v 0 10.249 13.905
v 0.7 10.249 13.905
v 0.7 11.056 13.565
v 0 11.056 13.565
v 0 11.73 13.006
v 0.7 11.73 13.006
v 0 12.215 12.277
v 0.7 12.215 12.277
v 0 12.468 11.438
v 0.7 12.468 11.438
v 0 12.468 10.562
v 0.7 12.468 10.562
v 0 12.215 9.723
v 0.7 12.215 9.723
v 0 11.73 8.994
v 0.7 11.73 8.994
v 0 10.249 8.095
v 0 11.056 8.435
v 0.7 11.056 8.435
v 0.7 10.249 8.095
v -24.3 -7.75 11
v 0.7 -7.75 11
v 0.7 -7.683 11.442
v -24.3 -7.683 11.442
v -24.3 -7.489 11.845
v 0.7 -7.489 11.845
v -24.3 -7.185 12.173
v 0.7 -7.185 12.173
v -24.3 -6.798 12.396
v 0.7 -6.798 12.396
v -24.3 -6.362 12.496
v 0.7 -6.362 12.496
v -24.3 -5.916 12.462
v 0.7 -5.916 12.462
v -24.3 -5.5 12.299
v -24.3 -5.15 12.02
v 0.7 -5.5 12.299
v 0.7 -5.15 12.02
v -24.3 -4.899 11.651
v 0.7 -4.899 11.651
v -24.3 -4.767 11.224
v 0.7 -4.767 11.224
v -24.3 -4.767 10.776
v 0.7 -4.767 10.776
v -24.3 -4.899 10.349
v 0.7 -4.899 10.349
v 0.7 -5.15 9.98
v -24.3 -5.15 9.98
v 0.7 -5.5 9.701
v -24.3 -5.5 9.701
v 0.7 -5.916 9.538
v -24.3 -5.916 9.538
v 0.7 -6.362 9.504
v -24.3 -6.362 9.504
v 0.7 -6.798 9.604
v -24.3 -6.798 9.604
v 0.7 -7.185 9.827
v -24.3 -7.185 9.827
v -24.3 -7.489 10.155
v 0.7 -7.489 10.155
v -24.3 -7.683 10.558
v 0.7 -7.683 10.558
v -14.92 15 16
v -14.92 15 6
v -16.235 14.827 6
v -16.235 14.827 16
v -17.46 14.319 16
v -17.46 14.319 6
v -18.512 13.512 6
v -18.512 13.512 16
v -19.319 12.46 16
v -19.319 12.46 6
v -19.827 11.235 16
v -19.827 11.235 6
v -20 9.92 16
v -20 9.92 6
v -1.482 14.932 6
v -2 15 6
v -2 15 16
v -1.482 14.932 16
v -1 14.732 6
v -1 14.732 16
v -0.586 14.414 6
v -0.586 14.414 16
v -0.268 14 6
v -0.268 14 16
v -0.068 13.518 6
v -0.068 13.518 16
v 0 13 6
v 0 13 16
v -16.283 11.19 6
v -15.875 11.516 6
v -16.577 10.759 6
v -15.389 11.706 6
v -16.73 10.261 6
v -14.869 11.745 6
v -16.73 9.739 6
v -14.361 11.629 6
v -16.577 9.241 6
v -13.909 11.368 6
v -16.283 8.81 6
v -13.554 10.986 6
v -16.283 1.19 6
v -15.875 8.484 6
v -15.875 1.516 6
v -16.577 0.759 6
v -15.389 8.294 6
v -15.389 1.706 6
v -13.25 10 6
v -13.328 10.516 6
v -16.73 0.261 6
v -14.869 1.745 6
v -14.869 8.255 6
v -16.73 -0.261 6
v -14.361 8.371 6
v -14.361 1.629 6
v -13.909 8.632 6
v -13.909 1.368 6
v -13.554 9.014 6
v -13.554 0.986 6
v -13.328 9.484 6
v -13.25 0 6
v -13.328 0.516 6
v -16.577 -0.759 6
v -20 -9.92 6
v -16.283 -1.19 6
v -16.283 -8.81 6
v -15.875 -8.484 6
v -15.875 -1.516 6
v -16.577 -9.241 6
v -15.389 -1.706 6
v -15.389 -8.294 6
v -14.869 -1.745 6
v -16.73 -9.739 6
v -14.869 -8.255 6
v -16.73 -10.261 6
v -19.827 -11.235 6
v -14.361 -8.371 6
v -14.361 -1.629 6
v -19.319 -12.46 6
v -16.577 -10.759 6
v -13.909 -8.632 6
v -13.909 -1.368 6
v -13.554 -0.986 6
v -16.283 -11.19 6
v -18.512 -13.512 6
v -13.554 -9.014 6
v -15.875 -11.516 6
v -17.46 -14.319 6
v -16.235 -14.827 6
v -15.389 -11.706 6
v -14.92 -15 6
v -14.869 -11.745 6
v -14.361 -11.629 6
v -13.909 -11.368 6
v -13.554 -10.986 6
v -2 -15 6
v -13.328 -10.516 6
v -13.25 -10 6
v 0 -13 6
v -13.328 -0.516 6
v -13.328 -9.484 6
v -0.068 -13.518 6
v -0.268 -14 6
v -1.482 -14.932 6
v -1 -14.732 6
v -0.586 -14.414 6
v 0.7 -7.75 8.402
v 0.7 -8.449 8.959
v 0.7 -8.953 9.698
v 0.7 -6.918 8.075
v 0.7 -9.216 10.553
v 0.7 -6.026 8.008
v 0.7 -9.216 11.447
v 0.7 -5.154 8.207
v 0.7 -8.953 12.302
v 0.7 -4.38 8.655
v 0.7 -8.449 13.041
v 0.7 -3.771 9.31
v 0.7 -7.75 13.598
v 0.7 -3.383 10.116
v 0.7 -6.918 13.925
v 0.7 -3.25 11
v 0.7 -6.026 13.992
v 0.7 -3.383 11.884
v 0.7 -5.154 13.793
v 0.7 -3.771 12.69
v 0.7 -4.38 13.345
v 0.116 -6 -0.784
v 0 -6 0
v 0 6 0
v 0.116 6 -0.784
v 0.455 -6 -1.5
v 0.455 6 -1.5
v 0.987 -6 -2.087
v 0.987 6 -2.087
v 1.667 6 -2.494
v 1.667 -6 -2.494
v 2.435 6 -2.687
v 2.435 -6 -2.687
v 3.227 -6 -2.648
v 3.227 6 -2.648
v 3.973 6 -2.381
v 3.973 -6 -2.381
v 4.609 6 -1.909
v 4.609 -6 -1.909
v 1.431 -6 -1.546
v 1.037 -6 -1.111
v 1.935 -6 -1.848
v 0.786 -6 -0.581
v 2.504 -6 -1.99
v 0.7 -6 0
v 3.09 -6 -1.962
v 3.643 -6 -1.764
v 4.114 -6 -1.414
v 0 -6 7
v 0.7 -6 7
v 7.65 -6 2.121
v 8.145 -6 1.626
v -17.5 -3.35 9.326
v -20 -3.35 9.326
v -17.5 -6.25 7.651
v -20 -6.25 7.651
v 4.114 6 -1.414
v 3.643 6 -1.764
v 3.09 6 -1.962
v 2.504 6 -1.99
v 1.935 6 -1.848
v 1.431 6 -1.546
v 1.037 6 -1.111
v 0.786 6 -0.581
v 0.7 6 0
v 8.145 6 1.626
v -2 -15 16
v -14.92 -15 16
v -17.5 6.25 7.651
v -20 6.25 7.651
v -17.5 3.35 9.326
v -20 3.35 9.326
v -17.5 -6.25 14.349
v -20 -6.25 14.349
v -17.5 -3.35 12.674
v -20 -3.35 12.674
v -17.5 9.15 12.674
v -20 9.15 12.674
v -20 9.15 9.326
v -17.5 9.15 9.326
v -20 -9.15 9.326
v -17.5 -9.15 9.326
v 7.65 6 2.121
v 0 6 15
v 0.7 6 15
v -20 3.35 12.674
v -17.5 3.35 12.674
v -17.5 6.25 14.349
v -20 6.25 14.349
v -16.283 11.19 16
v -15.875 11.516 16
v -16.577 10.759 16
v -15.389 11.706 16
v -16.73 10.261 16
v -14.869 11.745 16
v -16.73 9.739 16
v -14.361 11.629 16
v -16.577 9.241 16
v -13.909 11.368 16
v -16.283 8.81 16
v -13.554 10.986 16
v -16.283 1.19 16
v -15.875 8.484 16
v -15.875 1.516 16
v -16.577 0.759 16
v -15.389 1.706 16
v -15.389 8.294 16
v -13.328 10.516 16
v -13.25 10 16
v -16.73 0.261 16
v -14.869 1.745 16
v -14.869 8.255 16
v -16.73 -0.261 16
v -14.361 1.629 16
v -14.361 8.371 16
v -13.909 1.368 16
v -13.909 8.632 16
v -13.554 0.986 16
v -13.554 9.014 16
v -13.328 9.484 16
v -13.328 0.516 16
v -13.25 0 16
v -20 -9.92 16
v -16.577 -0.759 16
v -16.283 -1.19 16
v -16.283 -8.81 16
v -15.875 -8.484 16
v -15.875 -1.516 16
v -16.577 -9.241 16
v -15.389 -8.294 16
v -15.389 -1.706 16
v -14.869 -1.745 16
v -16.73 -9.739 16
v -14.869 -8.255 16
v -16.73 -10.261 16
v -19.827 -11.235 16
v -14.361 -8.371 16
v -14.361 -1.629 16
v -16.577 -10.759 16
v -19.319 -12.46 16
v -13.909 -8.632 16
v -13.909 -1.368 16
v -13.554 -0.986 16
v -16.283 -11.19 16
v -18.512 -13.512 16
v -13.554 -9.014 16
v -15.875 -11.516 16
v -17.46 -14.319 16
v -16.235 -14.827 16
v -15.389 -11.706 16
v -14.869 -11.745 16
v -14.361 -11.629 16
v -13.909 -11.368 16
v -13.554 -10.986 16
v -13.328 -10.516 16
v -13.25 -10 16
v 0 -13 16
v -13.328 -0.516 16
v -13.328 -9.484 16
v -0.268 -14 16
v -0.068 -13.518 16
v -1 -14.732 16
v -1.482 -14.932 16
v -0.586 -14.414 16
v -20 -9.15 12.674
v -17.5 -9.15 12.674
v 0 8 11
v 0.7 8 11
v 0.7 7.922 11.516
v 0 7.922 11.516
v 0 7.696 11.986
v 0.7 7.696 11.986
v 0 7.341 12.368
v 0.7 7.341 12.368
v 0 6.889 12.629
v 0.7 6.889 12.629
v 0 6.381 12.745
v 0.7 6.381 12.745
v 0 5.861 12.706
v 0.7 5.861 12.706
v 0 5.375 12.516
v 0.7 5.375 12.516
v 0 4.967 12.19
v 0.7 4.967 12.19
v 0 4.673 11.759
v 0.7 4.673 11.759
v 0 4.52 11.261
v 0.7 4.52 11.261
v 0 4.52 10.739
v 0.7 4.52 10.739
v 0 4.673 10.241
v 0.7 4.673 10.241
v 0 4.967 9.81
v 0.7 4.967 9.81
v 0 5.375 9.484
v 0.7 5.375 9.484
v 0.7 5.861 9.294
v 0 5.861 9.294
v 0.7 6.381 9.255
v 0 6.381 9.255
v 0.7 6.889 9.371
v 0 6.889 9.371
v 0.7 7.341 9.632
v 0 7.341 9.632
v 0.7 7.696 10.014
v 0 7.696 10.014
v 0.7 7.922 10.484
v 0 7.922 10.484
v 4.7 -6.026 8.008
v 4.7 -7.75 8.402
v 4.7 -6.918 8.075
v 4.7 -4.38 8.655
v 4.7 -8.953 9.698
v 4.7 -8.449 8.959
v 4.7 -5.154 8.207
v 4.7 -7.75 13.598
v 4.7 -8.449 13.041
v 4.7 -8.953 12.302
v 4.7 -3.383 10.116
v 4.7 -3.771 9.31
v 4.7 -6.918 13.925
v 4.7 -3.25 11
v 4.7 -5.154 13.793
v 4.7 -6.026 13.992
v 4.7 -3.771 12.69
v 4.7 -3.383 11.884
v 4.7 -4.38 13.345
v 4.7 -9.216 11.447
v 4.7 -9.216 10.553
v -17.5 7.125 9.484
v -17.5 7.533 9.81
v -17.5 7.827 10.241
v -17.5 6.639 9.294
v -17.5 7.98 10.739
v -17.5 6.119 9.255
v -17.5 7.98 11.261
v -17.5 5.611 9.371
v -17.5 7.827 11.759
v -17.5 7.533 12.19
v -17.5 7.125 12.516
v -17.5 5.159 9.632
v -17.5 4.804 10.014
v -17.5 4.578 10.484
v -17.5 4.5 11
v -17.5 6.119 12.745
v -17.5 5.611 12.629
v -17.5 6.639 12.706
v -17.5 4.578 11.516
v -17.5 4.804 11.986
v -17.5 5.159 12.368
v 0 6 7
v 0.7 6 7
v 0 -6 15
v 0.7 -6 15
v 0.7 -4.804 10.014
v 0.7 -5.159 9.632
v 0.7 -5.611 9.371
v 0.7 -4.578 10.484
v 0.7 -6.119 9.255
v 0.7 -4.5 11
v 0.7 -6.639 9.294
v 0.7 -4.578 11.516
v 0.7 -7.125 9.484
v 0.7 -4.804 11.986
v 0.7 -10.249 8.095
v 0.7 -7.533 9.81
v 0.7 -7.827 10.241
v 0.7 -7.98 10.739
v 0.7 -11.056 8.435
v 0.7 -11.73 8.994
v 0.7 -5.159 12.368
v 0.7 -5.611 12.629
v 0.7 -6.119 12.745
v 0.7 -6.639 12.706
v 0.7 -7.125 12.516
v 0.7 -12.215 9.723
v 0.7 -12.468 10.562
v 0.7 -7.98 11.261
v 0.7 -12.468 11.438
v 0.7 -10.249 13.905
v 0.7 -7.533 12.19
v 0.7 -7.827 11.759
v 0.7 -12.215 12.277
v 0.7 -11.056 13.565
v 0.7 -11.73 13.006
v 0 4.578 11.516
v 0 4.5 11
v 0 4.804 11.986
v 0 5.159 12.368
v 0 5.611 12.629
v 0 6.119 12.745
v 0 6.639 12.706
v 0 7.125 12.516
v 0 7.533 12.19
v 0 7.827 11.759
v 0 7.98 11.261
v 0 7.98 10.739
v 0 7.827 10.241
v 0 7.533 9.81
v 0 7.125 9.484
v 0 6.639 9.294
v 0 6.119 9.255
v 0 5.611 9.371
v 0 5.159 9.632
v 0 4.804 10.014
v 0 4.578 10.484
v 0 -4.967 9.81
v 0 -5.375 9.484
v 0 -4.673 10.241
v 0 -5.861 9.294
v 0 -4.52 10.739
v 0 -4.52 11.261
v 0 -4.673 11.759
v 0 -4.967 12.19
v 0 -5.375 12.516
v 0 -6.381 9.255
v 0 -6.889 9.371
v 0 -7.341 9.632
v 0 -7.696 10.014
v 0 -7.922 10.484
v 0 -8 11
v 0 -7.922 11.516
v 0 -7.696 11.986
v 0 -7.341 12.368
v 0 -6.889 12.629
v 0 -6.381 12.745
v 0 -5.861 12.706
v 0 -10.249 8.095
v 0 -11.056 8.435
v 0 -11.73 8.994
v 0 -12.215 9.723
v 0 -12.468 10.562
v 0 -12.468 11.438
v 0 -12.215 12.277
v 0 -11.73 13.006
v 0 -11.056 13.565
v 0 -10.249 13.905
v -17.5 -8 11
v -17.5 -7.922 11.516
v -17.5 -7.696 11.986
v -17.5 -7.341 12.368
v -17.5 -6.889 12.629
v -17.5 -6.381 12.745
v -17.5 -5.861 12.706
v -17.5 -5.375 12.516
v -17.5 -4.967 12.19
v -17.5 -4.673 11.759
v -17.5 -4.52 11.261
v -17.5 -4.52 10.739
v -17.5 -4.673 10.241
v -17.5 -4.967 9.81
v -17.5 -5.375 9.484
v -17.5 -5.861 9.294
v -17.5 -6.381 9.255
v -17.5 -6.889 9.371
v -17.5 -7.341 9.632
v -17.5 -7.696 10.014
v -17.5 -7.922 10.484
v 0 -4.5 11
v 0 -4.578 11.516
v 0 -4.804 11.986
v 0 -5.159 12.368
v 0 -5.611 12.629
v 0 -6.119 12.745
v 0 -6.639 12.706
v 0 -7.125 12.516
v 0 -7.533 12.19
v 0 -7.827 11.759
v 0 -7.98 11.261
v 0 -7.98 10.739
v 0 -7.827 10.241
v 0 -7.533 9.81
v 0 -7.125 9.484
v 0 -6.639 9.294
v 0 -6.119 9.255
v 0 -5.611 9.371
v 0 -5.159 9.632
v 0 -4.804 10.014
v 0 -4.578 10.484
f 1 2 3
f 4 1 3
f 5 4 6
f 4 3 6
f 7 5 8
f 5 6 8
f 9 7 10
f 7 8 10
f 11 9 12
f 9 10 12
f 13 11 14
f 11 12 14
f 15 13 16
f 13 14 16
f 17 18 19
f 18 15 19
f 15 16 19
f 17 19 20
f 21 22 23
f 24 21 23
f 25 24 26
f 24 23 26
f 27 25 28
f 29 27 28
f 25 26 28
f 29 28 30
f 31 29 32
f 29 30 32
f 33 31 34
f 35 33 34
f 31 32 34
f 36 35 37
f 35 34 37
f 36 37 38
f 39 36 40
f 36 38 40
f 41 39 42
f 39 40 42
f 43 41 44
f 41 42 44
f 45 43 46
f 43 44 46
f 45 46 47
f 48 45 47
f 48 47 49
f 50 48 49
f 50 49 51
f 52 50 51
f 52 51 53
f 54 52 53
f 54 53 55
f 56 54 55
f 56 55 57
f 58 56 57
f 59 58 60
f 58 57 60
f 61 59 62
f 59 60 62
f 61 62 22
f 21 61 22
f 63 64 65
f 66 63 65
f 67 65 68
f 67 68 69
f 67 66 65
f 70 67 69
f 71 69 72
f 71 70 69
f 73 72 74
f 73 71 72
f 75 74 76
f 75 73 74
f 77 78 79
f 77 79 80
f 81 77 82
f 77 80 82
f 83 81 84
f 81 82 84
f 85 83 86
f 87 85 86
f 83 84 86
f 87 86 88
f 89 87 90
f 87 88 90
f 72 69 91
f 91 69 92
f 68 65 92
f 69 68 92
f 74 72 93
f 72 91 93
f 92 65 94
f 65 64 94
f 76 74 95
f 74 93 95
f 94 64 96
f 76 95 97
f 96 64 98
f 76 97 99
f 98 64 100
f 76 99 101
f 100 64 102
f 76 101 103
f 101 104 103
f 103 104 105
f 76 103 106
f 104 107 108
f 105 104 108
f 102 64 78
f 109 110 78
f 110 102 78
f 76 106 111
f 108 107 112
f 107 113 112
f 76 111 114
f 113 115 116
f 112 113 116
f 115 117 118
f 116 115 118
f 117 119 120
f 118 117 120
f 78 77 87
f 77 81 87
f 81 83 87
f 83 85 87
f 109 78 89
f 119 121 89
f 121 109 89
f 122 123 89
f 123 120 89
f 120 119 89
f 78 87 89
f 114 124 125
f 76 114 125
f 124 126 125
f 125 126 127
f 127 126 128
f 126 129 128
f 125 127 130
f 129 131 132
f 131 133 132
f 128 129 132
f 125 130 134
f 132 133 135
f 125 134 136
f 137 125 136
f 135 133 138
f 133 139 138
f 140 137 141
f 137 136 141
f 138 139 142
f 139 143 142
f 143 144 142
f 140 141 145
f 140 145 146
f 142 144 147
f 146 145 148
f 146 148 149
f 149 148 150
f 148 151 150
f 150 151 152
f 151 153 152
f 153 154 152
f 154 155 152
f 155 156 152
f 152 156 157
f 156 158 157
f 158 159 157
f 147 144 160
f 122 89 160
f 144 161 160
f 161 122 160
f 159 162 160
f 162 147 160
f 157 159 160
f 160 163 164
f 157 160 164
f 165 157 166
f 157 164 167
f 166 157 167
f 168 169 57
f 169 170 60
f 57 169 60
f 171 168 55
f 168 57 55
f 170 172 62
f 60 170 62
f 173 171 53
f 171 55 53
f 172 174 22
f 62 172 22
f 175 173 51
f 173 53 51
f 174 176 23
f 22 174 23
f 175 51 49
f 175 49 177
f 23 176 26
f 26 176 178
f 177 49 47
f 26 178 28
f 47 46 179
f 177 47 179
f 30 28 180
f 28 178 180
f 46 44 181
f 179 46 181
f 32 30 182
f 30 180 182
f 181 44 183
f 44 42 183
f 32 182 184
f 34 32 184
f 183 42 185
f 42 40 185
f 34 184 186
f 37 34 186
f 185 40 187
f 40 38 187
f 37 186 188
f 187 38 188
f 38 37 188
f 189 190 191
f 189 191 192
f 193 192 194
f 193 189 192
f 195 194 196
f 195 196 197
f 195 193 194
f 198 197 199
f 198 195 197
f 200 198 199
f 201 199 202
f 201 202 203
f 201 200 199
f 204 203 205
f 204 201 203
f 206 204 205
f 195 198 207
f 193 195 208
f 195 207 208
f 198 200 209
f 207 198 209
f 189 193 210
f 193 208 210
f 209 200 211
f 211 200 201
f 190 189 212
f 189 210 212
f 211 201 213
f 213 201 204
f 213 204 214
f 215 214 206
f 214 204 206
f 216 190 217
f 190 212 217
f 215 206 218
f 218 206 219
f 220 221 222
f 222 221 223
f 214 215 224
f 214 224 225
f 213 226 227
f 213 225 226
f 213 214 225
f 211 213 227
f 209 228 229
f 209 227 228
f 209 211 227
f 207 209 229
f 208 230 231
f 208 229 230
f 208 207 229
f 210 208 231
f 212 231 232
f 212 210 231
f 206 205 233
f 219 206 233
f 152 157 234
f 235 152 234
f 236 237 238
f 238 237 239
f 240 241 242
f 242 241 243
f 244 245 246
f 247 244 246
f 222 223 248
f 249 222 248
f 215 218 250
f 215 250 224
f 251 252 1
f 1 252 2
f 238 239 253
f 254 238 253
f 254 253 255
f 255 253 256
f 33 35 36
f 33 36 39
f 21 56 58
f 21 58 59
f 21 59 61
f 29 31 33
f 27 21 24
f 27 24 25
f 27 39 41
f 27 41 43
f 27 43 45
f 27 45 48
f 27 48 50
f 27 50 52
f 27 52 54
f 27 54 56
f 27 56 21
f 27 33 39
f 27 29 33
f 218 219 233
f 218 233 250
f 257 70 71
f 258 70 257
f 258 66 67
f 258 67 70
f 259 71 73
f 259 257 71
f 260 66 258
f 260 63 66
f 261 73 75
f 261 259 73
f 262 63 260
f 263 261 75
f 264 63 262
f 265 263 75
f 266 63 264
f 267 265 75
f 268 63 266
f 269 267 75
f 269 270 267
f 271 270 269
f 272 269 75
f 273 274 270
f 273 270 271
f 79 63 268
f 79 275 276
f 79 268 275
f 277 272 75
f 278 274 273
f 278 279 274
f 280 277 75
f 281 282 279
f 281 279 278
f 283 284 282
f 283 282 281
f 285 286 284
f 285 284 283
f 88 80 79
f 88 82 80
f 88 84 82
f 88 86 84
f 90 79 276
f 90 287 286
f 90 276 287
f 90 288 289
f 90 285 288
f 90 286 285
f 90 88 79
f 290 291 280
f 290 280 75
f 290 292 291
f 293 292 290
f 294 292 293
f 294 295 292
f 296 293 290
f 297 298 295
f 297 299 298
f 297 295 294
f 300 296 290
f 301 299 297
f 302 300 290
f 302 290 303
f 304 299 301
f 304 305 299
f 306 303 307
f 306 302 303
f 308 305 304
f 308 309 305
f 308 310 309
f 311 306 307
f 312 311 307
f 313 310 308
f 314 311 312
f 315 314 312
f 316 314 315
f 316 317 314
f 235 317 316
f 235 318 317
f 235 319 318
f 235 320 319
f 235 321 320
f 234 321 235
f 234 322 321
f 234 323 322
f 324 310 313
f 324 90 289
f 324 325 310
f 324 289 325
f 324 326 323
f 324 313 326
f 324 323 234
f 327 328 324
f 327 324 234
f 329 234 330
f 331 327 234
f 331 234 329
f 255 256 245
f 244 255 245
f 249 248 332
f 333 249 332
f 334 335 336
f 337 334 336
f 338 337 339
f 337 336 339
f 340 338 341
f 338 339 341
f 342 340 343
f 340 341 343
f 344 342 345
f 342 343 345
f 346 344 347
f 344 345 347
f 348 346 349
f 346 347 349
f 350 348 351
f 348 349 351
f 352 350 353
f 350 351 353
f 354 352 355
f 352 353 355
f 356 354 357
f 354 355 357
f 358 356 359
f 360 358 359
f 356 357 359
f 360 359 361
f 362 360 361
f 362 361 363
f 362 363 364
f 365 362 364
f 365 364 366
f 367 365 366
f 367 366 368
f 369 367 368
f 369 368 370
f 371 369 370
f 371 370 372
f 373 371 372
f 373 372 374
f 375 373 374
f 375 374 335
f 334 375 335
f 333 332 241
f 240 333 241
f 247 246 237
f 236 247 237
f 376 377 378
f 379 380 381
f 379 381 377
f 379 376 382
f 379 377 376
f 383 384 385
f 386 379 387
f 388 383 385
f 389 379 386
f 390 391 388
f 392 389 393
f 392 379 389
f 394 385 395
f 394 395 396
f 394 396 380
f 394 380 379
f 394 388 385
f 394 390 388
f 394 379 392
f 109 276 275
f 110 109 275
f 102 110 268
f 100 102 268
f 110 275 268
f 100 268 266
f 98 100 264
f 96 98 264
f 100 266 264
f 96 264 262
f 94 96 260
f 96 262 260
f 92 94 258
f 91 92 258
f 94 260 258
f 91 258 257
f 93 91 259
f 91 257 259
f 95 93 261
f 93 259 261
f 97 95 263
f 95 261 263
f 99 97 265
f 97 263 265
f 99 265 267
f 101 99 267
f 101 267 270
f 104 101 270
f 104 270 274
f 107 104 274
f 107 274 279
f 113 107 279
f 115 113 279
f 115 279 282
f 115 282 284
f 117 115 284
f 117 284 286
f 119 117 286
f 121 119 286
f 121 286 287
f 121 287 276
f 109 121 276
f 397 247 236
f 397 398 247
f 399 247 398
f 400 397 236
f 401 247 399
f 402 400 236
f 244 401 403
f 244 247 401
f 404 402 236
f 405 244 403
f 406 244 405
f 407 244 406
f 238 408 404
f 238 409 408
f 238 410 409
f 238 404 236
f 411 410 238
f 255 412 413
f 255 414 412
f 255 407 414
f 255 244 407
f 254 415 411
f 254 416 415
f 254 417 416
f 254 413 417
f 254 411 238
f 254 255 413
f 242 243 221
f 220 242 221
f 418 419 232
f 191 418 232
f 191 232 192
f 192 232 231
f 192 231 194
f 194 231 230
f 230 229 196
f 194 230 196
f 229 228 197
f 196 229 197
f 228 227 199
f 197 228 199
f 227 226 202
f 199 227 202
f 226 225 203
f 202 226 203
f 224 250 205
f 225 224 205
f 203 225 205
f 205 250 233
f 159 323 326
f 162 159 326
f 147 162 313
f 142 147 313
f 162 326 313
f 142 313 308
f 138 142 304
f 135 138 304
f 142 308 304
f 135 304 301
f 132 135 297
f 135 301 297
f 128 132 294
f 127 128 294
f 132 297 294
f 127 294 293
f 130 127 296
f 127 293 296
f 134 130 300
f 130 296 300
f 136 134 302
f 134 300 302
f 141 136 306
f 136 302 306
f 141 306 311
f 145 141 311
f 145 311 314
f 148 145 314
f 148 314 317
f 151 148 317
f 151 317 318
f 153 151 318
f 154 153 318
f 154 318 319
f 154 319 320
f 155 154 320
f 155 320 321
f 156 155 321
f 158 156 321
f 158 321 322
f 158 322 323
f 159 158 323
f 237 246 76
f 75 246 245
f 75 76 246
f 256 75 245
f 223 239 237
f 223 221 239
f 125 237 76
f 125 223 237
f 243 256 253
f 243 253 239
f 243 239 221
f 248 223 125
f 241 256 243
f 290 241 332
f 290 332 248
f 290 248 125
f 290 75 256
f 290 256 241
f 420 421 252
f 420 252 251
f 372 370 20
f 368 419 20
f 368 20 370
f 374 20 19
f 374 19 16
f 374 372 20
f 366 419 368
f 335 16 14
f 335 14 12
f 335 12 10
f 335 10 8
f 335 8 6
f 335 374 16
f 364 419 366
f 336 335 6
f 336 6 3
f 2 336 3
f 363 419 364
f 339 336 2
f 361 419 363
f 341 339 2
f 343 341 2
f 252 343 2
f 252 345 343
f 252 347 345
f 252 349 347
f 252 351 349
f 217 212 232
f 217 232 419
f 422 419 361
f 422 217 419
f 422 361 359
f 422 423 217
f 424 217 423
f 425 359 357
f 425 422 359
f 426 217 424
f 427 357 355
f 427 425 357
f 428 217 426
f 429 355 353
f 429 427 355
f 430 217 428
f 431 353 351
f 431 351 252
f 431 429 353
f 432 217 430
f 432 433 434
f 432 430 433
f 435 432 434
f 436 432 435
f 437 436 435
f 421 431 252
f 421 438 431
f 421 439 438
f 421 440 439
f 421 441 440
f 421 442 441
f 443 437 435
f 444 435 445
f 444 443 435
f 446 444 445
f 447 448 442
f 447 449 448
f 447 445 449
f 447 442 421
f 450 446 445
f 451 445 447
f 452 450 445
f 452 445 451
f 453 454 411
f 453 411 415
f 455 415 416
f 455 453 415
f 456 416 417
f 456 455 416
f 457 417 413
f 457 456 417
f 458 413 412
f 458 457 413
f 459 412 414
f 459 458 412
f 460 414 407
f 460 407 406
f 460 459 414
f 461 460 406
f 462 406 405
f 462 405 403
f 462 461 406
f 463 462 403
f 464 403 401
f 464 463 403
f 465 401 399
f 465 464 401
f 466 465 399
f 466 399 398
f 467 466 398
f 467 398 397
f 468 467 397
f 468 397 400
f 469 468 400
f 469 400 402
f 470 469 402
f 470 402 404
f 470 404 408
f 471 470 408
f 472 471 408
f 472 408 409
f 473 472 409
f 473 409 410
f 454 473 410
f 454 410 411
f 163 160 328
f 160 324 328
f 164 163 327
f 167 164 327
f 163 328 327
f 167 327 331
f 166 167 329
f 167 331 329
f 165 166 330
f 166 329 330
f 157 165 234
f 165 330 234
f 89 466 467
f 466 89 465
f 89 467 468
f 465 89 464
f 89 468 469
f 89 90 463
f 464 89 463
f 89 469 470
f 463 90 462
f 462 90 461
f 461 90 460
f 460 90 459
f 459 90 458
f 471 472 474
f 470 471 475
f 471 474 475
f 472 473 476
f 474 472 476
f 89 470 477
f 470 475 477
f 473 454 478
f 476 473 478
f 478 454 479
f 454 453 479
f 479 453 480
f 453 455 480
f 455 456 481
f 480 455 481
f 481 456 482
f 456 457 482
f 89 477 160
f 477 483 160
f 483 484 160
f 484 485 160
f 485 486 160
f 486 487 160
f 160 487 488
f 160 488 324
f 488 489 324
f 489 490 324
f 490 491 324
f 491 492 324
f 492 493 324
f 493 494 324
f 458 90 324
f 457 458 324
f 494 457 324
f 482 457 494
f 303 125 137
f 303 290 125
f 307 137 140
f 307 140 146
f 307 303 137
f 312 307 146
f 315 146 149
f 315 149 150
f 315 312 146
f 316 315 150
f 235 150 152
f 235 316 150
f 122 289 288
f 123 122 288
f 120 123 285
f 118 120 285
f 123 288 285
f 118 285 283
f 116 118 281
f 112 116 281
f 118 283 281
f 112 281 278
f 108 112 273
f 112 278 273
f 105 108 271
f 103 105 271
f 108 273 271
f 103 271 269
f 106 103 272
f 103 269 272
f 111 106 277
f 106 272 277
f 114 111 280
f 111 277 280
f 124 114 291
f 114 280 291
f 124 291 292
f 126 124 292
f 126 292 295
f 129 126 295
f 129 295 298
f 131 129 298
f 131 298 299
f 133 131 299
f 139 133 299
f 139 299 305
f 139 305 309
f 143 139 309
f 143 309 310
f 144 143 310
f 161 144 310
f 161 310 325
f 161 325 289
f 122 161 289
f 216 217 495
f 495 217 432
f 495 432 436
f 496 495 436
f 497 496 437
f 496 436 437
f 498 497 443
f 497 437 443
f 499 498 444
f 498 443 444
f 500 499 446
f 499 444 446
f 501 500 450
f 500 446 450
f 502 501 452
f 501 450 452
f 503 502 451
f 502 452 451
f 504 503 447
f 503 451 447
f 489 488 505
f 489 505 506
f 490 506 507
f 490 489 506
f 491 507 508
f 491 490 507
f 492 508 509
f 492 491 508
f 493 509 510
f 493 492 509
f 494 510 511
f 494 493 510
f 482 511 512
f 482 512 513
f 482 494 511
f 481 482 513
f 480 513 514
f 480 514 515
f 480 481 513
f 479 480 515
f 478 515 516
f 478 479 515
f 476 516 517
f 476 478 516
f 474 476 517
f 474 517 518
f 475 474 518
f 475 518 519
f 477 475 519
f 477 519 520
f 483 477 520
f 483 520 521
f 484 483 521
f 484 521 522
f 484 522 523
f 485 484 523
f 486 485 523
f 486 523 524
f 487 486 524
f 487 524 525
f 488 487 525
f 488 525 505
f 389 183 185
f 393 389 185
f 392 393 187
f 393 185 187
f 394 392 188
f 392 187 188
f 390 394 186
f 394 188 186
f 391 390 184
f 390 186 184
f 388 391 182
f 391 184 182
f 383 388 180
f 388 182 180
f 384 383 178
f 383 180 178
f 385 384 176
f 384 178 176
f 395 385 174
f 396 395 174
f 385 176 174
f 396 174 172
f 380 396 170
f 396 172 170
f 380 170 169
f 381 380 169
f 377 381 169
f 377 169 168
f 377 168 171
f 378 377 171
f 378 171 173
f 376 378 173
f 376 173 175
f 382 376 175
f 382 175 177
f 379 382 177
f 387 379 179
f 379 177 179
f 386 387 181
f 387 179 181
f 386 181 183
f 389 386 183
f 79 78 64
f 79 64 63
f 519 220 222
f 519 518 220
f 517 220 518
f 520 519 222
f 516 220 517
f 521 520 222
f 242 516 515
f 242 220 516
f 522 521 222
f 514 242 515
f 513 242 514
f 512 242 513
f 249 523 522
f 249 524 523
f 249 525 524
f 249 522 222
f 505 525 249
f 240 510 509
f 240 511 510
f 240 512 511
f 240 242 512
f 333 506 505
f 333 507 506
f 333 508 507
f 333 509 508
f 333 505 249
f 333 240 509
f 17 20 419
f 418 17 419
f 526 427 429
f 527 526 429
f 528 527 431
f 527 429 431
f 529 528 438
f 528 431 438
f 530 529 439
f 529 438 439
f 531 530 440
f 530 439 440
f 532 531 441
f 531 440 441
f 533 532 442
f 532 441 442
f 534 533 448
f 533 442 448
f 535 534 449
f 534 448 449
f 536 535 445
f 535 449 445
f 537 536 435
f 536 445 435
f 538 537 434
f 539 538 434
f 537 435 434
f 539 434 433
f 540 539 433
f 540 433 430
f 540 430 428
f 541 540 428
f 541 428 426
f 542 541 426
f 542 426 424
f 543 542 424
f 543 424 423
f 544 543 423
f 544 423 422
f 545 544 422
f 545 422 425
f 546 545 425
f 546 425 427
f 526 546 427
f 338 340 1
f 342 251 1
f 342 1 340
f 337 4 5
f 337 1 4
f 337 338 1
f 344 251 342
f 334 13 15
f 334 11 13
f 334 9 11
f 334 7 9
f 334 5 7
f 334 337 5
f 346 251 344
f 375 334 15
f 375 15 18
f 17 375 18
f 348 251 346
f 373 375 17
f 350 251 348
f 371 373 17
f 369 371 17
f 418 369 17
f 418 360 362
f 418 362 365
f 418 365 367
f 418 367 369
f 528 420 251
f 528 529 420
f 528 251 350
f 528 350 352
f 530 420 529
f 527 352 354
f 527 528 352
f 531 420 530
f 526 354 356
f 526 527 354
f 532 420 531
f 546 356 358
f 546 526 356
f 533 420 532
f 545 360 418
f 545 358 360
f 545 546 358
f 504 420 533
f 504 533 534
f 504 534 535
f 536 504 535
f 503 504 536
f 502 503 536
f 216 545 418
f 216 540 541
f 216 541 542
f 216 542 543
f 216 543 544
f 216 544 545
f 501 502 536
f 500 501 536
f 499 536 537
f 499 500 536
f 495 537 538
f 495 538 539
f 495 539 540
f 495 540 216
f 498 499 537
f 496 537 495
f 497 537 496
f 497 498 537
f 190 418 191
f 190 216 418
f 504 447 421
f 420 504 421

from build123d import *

# Parameters (mm, degrees)
F1_DEPTH  = 12.5
F3_DEPTH  = 50
F4_R      = 1.75
F5_DEPTH  = 0.701
F6_R      = 3
F6_R_2    = 1.75
F7_DEPTH  = 4
F8_R      = 1.5
F9_DEPTH  = 25
F10_W     = 30
F10_H     = 10
F10_R     = 1.75
F11_DEPTH = 20
F12_R     = 16.267229
F13_DEPTH = 15
F15_R     = 1.75
F16_DEPTH = 2.5
F17_R     = 1.75
F18_DEPTH = 18.701
F19_R     = 2
F20_R     = 5.08


with BuildPart() as f1:
    # F0 (on Front) → F1 (new body, symmetric)
    with BuildSketch(Plane.XZ):
        with BuildLine():
            Line((0.7, 0), (0.7, 15))
            Line((0.7, 15), (0, 15))
            Line((0, 15), (0, 0))
            ThreePointArc((0, 0), (1.666755, -2.494475), (4.609188, -1.909188))
            Line((4.609188, -1.909188), (8.144722, 1.626346))
            Line((8.144722, 1.626346), (7.649747, 2.12132))
            Line((7.649747, 2.12132), (4.114214, -1.414214))
            ThreePointArc((4.114214, -1.414214), (1.934633, -1.847759), (0.7, 0))
        make_face()
    extrude(amount=F1_DEPTH, both=True)

    # F2 (on Right) → F3 (cut, symmetric)
    with BuildSketch(Plane.YZ):
        with BuildLine():
            ThreePointArc((-10.248665, 8.094918), (-12.5, 11), (-10.248665, 13.905082))
            Line((-10.248665, 13.905082), (-6, 15))
            Line((-6, 15), (6, 15))
            Line((6, 15), (10.248665, 13.905082))
            ThreePointArc((10.248665, 13.905082), (12.5, 11), (10.248665, 8.094918))
            Line((10.248665, 8.094918), (6, 7))
            Line((6, 7), (6, -10))
            Line((6, -10), (17.5, -10))
            Line((17.5, -10), (17.5, 20))
            Line((17.5, 20), (-17.5, 20))
            Line((-17.5, 20), (-17.5, -10))
            Line((-17.5, -10), (-6, -10))
            Line((-6, -10), (-6, 7))
            Line((-6, 7), (-10.248665, 8.094918))
        make_face()
    extrude(amount=F3_DEPTH, both=True, mode=Mode.SUBTRACT)

    # F4 (on face) → F5 (cut, through all)
    with BuildSketch(Plane.YZ.offset(0.7)):
        with Locations((-6.25, 11)):
            Circle(F4_R)
        with Locations((6.25, 11)):
            Circle(F4_R)
    extrude(amount=-F5_DEPTH, mode=Mode.SUBTRACT)


with BuildPart() as f7:
    # F6 (on face) → F7 (new body)
    with BuildSketch(Plane.YZ.offset(0.7)):
        with Locations((-6.25, 11)):
            Circle(F6_R)
        with Locations((-6.25, 11)):
            Circle(F6_R_2, mode=Mode.SUBTRACT)
        with Locations((-6.25, 11)):
            Circle(F6_R_2)
    extrude(amount=F7_DEPTH)

    # F8 (on face) → F9 (join)
    with BuildSketch(Plane(origin=(0.7, 0, 0), x_dir=(0, -1, 0), z_dir=(-1, 0, 0))):
        with Locations((6.25, 11)):
            Circle(F8_R)
    extrude(amount=F9_DEPTH)


with BuildPart() as f11:
    # F10 (on face) → F11 (new body)
    with BuildSketch(Plane(origin=(0, 0, 0), x_dir=(0, -1, 0), z_dir=(-1, 0, 0))):
        with Locations((0, 11)):
            Rectangle(F10_W, F10_H)
        with Locations((-6.25, 11)):
            Circle(F10_R, mode=Mode.SUBTRACT)
        with Locations((6.25, 11)):
            Circle(F10_R, mode=Mode.SUBTRACT)
    extrude(amount=F11_DEPTH)

    # F15 (on face) → F16 (cut)
    with BuildSketch(Plane(origin=(-20, 0, 0), x_dir=(0, -1, 0), z_dir=(-1, 0, 0))):
        Polygon((-3.35, 12.674316), (-6.25, 14.348632), (-9.15, 12.674316), (-9.15, 9.325684), (-6.25, 7.651368), (-3.35, 9.325684), align=None)
        with Locations((-6.25, 11)):
            Circle(F15_R, mode=Mode.SUBTRACT)
        Polygon((6.25, 14.348632), (3.35, 12.674316), (3.35, 9.325684), (6.25, 7.651368), (9.15, 9.325684), (9.15, 12.674316), align=None)
        with Locations((6.25, 11)):
            Circle(F15_R, mode=Mode.SUBTRACT)
    extrude(amount=-F16_DEPTH, mode=Mode.SUBTRACT)

    # F17 (on face) → F18 (cut, through all)
    with BuildSketch(Plane.XY.offset(16)):
        with Locations((-15, 10)):
            Circle(F17_R)
        with Locations((-15, 0)):
            Circle(F17_R)
        with Locations((-15, -10)):
            Circle(F17_R)
    extrude(amount=-F18_DEPTH, mode=Mode.SUBTRACT)

    # F19
    f19_edges = [f11.edges().sort_by_distance(p)[0] for p in [
        (0, 15, 11),
        (0, -15, 11),
    ]]
    fillet(f19_edges, radius=F19_R)

    # F20
    f20_edges = [f11.edges().sort_by_distance(p)[0] for p in [
        (-20, -15, 11),
        (-20, 15, 11),
    ]]
    fillet(f20_edges, radius=F20_R)


with BuildPart() as f13:
    # F12 (on Top) → F13 (new body)
    with BuildSketch(Plane.XY):
        with Locations((-53.400151, -32.228447)):
            Circle(F12_R)
    extrude(amount=F13_DEPTH)


solid = Compound([f1.part, f7.part, f11.part])
